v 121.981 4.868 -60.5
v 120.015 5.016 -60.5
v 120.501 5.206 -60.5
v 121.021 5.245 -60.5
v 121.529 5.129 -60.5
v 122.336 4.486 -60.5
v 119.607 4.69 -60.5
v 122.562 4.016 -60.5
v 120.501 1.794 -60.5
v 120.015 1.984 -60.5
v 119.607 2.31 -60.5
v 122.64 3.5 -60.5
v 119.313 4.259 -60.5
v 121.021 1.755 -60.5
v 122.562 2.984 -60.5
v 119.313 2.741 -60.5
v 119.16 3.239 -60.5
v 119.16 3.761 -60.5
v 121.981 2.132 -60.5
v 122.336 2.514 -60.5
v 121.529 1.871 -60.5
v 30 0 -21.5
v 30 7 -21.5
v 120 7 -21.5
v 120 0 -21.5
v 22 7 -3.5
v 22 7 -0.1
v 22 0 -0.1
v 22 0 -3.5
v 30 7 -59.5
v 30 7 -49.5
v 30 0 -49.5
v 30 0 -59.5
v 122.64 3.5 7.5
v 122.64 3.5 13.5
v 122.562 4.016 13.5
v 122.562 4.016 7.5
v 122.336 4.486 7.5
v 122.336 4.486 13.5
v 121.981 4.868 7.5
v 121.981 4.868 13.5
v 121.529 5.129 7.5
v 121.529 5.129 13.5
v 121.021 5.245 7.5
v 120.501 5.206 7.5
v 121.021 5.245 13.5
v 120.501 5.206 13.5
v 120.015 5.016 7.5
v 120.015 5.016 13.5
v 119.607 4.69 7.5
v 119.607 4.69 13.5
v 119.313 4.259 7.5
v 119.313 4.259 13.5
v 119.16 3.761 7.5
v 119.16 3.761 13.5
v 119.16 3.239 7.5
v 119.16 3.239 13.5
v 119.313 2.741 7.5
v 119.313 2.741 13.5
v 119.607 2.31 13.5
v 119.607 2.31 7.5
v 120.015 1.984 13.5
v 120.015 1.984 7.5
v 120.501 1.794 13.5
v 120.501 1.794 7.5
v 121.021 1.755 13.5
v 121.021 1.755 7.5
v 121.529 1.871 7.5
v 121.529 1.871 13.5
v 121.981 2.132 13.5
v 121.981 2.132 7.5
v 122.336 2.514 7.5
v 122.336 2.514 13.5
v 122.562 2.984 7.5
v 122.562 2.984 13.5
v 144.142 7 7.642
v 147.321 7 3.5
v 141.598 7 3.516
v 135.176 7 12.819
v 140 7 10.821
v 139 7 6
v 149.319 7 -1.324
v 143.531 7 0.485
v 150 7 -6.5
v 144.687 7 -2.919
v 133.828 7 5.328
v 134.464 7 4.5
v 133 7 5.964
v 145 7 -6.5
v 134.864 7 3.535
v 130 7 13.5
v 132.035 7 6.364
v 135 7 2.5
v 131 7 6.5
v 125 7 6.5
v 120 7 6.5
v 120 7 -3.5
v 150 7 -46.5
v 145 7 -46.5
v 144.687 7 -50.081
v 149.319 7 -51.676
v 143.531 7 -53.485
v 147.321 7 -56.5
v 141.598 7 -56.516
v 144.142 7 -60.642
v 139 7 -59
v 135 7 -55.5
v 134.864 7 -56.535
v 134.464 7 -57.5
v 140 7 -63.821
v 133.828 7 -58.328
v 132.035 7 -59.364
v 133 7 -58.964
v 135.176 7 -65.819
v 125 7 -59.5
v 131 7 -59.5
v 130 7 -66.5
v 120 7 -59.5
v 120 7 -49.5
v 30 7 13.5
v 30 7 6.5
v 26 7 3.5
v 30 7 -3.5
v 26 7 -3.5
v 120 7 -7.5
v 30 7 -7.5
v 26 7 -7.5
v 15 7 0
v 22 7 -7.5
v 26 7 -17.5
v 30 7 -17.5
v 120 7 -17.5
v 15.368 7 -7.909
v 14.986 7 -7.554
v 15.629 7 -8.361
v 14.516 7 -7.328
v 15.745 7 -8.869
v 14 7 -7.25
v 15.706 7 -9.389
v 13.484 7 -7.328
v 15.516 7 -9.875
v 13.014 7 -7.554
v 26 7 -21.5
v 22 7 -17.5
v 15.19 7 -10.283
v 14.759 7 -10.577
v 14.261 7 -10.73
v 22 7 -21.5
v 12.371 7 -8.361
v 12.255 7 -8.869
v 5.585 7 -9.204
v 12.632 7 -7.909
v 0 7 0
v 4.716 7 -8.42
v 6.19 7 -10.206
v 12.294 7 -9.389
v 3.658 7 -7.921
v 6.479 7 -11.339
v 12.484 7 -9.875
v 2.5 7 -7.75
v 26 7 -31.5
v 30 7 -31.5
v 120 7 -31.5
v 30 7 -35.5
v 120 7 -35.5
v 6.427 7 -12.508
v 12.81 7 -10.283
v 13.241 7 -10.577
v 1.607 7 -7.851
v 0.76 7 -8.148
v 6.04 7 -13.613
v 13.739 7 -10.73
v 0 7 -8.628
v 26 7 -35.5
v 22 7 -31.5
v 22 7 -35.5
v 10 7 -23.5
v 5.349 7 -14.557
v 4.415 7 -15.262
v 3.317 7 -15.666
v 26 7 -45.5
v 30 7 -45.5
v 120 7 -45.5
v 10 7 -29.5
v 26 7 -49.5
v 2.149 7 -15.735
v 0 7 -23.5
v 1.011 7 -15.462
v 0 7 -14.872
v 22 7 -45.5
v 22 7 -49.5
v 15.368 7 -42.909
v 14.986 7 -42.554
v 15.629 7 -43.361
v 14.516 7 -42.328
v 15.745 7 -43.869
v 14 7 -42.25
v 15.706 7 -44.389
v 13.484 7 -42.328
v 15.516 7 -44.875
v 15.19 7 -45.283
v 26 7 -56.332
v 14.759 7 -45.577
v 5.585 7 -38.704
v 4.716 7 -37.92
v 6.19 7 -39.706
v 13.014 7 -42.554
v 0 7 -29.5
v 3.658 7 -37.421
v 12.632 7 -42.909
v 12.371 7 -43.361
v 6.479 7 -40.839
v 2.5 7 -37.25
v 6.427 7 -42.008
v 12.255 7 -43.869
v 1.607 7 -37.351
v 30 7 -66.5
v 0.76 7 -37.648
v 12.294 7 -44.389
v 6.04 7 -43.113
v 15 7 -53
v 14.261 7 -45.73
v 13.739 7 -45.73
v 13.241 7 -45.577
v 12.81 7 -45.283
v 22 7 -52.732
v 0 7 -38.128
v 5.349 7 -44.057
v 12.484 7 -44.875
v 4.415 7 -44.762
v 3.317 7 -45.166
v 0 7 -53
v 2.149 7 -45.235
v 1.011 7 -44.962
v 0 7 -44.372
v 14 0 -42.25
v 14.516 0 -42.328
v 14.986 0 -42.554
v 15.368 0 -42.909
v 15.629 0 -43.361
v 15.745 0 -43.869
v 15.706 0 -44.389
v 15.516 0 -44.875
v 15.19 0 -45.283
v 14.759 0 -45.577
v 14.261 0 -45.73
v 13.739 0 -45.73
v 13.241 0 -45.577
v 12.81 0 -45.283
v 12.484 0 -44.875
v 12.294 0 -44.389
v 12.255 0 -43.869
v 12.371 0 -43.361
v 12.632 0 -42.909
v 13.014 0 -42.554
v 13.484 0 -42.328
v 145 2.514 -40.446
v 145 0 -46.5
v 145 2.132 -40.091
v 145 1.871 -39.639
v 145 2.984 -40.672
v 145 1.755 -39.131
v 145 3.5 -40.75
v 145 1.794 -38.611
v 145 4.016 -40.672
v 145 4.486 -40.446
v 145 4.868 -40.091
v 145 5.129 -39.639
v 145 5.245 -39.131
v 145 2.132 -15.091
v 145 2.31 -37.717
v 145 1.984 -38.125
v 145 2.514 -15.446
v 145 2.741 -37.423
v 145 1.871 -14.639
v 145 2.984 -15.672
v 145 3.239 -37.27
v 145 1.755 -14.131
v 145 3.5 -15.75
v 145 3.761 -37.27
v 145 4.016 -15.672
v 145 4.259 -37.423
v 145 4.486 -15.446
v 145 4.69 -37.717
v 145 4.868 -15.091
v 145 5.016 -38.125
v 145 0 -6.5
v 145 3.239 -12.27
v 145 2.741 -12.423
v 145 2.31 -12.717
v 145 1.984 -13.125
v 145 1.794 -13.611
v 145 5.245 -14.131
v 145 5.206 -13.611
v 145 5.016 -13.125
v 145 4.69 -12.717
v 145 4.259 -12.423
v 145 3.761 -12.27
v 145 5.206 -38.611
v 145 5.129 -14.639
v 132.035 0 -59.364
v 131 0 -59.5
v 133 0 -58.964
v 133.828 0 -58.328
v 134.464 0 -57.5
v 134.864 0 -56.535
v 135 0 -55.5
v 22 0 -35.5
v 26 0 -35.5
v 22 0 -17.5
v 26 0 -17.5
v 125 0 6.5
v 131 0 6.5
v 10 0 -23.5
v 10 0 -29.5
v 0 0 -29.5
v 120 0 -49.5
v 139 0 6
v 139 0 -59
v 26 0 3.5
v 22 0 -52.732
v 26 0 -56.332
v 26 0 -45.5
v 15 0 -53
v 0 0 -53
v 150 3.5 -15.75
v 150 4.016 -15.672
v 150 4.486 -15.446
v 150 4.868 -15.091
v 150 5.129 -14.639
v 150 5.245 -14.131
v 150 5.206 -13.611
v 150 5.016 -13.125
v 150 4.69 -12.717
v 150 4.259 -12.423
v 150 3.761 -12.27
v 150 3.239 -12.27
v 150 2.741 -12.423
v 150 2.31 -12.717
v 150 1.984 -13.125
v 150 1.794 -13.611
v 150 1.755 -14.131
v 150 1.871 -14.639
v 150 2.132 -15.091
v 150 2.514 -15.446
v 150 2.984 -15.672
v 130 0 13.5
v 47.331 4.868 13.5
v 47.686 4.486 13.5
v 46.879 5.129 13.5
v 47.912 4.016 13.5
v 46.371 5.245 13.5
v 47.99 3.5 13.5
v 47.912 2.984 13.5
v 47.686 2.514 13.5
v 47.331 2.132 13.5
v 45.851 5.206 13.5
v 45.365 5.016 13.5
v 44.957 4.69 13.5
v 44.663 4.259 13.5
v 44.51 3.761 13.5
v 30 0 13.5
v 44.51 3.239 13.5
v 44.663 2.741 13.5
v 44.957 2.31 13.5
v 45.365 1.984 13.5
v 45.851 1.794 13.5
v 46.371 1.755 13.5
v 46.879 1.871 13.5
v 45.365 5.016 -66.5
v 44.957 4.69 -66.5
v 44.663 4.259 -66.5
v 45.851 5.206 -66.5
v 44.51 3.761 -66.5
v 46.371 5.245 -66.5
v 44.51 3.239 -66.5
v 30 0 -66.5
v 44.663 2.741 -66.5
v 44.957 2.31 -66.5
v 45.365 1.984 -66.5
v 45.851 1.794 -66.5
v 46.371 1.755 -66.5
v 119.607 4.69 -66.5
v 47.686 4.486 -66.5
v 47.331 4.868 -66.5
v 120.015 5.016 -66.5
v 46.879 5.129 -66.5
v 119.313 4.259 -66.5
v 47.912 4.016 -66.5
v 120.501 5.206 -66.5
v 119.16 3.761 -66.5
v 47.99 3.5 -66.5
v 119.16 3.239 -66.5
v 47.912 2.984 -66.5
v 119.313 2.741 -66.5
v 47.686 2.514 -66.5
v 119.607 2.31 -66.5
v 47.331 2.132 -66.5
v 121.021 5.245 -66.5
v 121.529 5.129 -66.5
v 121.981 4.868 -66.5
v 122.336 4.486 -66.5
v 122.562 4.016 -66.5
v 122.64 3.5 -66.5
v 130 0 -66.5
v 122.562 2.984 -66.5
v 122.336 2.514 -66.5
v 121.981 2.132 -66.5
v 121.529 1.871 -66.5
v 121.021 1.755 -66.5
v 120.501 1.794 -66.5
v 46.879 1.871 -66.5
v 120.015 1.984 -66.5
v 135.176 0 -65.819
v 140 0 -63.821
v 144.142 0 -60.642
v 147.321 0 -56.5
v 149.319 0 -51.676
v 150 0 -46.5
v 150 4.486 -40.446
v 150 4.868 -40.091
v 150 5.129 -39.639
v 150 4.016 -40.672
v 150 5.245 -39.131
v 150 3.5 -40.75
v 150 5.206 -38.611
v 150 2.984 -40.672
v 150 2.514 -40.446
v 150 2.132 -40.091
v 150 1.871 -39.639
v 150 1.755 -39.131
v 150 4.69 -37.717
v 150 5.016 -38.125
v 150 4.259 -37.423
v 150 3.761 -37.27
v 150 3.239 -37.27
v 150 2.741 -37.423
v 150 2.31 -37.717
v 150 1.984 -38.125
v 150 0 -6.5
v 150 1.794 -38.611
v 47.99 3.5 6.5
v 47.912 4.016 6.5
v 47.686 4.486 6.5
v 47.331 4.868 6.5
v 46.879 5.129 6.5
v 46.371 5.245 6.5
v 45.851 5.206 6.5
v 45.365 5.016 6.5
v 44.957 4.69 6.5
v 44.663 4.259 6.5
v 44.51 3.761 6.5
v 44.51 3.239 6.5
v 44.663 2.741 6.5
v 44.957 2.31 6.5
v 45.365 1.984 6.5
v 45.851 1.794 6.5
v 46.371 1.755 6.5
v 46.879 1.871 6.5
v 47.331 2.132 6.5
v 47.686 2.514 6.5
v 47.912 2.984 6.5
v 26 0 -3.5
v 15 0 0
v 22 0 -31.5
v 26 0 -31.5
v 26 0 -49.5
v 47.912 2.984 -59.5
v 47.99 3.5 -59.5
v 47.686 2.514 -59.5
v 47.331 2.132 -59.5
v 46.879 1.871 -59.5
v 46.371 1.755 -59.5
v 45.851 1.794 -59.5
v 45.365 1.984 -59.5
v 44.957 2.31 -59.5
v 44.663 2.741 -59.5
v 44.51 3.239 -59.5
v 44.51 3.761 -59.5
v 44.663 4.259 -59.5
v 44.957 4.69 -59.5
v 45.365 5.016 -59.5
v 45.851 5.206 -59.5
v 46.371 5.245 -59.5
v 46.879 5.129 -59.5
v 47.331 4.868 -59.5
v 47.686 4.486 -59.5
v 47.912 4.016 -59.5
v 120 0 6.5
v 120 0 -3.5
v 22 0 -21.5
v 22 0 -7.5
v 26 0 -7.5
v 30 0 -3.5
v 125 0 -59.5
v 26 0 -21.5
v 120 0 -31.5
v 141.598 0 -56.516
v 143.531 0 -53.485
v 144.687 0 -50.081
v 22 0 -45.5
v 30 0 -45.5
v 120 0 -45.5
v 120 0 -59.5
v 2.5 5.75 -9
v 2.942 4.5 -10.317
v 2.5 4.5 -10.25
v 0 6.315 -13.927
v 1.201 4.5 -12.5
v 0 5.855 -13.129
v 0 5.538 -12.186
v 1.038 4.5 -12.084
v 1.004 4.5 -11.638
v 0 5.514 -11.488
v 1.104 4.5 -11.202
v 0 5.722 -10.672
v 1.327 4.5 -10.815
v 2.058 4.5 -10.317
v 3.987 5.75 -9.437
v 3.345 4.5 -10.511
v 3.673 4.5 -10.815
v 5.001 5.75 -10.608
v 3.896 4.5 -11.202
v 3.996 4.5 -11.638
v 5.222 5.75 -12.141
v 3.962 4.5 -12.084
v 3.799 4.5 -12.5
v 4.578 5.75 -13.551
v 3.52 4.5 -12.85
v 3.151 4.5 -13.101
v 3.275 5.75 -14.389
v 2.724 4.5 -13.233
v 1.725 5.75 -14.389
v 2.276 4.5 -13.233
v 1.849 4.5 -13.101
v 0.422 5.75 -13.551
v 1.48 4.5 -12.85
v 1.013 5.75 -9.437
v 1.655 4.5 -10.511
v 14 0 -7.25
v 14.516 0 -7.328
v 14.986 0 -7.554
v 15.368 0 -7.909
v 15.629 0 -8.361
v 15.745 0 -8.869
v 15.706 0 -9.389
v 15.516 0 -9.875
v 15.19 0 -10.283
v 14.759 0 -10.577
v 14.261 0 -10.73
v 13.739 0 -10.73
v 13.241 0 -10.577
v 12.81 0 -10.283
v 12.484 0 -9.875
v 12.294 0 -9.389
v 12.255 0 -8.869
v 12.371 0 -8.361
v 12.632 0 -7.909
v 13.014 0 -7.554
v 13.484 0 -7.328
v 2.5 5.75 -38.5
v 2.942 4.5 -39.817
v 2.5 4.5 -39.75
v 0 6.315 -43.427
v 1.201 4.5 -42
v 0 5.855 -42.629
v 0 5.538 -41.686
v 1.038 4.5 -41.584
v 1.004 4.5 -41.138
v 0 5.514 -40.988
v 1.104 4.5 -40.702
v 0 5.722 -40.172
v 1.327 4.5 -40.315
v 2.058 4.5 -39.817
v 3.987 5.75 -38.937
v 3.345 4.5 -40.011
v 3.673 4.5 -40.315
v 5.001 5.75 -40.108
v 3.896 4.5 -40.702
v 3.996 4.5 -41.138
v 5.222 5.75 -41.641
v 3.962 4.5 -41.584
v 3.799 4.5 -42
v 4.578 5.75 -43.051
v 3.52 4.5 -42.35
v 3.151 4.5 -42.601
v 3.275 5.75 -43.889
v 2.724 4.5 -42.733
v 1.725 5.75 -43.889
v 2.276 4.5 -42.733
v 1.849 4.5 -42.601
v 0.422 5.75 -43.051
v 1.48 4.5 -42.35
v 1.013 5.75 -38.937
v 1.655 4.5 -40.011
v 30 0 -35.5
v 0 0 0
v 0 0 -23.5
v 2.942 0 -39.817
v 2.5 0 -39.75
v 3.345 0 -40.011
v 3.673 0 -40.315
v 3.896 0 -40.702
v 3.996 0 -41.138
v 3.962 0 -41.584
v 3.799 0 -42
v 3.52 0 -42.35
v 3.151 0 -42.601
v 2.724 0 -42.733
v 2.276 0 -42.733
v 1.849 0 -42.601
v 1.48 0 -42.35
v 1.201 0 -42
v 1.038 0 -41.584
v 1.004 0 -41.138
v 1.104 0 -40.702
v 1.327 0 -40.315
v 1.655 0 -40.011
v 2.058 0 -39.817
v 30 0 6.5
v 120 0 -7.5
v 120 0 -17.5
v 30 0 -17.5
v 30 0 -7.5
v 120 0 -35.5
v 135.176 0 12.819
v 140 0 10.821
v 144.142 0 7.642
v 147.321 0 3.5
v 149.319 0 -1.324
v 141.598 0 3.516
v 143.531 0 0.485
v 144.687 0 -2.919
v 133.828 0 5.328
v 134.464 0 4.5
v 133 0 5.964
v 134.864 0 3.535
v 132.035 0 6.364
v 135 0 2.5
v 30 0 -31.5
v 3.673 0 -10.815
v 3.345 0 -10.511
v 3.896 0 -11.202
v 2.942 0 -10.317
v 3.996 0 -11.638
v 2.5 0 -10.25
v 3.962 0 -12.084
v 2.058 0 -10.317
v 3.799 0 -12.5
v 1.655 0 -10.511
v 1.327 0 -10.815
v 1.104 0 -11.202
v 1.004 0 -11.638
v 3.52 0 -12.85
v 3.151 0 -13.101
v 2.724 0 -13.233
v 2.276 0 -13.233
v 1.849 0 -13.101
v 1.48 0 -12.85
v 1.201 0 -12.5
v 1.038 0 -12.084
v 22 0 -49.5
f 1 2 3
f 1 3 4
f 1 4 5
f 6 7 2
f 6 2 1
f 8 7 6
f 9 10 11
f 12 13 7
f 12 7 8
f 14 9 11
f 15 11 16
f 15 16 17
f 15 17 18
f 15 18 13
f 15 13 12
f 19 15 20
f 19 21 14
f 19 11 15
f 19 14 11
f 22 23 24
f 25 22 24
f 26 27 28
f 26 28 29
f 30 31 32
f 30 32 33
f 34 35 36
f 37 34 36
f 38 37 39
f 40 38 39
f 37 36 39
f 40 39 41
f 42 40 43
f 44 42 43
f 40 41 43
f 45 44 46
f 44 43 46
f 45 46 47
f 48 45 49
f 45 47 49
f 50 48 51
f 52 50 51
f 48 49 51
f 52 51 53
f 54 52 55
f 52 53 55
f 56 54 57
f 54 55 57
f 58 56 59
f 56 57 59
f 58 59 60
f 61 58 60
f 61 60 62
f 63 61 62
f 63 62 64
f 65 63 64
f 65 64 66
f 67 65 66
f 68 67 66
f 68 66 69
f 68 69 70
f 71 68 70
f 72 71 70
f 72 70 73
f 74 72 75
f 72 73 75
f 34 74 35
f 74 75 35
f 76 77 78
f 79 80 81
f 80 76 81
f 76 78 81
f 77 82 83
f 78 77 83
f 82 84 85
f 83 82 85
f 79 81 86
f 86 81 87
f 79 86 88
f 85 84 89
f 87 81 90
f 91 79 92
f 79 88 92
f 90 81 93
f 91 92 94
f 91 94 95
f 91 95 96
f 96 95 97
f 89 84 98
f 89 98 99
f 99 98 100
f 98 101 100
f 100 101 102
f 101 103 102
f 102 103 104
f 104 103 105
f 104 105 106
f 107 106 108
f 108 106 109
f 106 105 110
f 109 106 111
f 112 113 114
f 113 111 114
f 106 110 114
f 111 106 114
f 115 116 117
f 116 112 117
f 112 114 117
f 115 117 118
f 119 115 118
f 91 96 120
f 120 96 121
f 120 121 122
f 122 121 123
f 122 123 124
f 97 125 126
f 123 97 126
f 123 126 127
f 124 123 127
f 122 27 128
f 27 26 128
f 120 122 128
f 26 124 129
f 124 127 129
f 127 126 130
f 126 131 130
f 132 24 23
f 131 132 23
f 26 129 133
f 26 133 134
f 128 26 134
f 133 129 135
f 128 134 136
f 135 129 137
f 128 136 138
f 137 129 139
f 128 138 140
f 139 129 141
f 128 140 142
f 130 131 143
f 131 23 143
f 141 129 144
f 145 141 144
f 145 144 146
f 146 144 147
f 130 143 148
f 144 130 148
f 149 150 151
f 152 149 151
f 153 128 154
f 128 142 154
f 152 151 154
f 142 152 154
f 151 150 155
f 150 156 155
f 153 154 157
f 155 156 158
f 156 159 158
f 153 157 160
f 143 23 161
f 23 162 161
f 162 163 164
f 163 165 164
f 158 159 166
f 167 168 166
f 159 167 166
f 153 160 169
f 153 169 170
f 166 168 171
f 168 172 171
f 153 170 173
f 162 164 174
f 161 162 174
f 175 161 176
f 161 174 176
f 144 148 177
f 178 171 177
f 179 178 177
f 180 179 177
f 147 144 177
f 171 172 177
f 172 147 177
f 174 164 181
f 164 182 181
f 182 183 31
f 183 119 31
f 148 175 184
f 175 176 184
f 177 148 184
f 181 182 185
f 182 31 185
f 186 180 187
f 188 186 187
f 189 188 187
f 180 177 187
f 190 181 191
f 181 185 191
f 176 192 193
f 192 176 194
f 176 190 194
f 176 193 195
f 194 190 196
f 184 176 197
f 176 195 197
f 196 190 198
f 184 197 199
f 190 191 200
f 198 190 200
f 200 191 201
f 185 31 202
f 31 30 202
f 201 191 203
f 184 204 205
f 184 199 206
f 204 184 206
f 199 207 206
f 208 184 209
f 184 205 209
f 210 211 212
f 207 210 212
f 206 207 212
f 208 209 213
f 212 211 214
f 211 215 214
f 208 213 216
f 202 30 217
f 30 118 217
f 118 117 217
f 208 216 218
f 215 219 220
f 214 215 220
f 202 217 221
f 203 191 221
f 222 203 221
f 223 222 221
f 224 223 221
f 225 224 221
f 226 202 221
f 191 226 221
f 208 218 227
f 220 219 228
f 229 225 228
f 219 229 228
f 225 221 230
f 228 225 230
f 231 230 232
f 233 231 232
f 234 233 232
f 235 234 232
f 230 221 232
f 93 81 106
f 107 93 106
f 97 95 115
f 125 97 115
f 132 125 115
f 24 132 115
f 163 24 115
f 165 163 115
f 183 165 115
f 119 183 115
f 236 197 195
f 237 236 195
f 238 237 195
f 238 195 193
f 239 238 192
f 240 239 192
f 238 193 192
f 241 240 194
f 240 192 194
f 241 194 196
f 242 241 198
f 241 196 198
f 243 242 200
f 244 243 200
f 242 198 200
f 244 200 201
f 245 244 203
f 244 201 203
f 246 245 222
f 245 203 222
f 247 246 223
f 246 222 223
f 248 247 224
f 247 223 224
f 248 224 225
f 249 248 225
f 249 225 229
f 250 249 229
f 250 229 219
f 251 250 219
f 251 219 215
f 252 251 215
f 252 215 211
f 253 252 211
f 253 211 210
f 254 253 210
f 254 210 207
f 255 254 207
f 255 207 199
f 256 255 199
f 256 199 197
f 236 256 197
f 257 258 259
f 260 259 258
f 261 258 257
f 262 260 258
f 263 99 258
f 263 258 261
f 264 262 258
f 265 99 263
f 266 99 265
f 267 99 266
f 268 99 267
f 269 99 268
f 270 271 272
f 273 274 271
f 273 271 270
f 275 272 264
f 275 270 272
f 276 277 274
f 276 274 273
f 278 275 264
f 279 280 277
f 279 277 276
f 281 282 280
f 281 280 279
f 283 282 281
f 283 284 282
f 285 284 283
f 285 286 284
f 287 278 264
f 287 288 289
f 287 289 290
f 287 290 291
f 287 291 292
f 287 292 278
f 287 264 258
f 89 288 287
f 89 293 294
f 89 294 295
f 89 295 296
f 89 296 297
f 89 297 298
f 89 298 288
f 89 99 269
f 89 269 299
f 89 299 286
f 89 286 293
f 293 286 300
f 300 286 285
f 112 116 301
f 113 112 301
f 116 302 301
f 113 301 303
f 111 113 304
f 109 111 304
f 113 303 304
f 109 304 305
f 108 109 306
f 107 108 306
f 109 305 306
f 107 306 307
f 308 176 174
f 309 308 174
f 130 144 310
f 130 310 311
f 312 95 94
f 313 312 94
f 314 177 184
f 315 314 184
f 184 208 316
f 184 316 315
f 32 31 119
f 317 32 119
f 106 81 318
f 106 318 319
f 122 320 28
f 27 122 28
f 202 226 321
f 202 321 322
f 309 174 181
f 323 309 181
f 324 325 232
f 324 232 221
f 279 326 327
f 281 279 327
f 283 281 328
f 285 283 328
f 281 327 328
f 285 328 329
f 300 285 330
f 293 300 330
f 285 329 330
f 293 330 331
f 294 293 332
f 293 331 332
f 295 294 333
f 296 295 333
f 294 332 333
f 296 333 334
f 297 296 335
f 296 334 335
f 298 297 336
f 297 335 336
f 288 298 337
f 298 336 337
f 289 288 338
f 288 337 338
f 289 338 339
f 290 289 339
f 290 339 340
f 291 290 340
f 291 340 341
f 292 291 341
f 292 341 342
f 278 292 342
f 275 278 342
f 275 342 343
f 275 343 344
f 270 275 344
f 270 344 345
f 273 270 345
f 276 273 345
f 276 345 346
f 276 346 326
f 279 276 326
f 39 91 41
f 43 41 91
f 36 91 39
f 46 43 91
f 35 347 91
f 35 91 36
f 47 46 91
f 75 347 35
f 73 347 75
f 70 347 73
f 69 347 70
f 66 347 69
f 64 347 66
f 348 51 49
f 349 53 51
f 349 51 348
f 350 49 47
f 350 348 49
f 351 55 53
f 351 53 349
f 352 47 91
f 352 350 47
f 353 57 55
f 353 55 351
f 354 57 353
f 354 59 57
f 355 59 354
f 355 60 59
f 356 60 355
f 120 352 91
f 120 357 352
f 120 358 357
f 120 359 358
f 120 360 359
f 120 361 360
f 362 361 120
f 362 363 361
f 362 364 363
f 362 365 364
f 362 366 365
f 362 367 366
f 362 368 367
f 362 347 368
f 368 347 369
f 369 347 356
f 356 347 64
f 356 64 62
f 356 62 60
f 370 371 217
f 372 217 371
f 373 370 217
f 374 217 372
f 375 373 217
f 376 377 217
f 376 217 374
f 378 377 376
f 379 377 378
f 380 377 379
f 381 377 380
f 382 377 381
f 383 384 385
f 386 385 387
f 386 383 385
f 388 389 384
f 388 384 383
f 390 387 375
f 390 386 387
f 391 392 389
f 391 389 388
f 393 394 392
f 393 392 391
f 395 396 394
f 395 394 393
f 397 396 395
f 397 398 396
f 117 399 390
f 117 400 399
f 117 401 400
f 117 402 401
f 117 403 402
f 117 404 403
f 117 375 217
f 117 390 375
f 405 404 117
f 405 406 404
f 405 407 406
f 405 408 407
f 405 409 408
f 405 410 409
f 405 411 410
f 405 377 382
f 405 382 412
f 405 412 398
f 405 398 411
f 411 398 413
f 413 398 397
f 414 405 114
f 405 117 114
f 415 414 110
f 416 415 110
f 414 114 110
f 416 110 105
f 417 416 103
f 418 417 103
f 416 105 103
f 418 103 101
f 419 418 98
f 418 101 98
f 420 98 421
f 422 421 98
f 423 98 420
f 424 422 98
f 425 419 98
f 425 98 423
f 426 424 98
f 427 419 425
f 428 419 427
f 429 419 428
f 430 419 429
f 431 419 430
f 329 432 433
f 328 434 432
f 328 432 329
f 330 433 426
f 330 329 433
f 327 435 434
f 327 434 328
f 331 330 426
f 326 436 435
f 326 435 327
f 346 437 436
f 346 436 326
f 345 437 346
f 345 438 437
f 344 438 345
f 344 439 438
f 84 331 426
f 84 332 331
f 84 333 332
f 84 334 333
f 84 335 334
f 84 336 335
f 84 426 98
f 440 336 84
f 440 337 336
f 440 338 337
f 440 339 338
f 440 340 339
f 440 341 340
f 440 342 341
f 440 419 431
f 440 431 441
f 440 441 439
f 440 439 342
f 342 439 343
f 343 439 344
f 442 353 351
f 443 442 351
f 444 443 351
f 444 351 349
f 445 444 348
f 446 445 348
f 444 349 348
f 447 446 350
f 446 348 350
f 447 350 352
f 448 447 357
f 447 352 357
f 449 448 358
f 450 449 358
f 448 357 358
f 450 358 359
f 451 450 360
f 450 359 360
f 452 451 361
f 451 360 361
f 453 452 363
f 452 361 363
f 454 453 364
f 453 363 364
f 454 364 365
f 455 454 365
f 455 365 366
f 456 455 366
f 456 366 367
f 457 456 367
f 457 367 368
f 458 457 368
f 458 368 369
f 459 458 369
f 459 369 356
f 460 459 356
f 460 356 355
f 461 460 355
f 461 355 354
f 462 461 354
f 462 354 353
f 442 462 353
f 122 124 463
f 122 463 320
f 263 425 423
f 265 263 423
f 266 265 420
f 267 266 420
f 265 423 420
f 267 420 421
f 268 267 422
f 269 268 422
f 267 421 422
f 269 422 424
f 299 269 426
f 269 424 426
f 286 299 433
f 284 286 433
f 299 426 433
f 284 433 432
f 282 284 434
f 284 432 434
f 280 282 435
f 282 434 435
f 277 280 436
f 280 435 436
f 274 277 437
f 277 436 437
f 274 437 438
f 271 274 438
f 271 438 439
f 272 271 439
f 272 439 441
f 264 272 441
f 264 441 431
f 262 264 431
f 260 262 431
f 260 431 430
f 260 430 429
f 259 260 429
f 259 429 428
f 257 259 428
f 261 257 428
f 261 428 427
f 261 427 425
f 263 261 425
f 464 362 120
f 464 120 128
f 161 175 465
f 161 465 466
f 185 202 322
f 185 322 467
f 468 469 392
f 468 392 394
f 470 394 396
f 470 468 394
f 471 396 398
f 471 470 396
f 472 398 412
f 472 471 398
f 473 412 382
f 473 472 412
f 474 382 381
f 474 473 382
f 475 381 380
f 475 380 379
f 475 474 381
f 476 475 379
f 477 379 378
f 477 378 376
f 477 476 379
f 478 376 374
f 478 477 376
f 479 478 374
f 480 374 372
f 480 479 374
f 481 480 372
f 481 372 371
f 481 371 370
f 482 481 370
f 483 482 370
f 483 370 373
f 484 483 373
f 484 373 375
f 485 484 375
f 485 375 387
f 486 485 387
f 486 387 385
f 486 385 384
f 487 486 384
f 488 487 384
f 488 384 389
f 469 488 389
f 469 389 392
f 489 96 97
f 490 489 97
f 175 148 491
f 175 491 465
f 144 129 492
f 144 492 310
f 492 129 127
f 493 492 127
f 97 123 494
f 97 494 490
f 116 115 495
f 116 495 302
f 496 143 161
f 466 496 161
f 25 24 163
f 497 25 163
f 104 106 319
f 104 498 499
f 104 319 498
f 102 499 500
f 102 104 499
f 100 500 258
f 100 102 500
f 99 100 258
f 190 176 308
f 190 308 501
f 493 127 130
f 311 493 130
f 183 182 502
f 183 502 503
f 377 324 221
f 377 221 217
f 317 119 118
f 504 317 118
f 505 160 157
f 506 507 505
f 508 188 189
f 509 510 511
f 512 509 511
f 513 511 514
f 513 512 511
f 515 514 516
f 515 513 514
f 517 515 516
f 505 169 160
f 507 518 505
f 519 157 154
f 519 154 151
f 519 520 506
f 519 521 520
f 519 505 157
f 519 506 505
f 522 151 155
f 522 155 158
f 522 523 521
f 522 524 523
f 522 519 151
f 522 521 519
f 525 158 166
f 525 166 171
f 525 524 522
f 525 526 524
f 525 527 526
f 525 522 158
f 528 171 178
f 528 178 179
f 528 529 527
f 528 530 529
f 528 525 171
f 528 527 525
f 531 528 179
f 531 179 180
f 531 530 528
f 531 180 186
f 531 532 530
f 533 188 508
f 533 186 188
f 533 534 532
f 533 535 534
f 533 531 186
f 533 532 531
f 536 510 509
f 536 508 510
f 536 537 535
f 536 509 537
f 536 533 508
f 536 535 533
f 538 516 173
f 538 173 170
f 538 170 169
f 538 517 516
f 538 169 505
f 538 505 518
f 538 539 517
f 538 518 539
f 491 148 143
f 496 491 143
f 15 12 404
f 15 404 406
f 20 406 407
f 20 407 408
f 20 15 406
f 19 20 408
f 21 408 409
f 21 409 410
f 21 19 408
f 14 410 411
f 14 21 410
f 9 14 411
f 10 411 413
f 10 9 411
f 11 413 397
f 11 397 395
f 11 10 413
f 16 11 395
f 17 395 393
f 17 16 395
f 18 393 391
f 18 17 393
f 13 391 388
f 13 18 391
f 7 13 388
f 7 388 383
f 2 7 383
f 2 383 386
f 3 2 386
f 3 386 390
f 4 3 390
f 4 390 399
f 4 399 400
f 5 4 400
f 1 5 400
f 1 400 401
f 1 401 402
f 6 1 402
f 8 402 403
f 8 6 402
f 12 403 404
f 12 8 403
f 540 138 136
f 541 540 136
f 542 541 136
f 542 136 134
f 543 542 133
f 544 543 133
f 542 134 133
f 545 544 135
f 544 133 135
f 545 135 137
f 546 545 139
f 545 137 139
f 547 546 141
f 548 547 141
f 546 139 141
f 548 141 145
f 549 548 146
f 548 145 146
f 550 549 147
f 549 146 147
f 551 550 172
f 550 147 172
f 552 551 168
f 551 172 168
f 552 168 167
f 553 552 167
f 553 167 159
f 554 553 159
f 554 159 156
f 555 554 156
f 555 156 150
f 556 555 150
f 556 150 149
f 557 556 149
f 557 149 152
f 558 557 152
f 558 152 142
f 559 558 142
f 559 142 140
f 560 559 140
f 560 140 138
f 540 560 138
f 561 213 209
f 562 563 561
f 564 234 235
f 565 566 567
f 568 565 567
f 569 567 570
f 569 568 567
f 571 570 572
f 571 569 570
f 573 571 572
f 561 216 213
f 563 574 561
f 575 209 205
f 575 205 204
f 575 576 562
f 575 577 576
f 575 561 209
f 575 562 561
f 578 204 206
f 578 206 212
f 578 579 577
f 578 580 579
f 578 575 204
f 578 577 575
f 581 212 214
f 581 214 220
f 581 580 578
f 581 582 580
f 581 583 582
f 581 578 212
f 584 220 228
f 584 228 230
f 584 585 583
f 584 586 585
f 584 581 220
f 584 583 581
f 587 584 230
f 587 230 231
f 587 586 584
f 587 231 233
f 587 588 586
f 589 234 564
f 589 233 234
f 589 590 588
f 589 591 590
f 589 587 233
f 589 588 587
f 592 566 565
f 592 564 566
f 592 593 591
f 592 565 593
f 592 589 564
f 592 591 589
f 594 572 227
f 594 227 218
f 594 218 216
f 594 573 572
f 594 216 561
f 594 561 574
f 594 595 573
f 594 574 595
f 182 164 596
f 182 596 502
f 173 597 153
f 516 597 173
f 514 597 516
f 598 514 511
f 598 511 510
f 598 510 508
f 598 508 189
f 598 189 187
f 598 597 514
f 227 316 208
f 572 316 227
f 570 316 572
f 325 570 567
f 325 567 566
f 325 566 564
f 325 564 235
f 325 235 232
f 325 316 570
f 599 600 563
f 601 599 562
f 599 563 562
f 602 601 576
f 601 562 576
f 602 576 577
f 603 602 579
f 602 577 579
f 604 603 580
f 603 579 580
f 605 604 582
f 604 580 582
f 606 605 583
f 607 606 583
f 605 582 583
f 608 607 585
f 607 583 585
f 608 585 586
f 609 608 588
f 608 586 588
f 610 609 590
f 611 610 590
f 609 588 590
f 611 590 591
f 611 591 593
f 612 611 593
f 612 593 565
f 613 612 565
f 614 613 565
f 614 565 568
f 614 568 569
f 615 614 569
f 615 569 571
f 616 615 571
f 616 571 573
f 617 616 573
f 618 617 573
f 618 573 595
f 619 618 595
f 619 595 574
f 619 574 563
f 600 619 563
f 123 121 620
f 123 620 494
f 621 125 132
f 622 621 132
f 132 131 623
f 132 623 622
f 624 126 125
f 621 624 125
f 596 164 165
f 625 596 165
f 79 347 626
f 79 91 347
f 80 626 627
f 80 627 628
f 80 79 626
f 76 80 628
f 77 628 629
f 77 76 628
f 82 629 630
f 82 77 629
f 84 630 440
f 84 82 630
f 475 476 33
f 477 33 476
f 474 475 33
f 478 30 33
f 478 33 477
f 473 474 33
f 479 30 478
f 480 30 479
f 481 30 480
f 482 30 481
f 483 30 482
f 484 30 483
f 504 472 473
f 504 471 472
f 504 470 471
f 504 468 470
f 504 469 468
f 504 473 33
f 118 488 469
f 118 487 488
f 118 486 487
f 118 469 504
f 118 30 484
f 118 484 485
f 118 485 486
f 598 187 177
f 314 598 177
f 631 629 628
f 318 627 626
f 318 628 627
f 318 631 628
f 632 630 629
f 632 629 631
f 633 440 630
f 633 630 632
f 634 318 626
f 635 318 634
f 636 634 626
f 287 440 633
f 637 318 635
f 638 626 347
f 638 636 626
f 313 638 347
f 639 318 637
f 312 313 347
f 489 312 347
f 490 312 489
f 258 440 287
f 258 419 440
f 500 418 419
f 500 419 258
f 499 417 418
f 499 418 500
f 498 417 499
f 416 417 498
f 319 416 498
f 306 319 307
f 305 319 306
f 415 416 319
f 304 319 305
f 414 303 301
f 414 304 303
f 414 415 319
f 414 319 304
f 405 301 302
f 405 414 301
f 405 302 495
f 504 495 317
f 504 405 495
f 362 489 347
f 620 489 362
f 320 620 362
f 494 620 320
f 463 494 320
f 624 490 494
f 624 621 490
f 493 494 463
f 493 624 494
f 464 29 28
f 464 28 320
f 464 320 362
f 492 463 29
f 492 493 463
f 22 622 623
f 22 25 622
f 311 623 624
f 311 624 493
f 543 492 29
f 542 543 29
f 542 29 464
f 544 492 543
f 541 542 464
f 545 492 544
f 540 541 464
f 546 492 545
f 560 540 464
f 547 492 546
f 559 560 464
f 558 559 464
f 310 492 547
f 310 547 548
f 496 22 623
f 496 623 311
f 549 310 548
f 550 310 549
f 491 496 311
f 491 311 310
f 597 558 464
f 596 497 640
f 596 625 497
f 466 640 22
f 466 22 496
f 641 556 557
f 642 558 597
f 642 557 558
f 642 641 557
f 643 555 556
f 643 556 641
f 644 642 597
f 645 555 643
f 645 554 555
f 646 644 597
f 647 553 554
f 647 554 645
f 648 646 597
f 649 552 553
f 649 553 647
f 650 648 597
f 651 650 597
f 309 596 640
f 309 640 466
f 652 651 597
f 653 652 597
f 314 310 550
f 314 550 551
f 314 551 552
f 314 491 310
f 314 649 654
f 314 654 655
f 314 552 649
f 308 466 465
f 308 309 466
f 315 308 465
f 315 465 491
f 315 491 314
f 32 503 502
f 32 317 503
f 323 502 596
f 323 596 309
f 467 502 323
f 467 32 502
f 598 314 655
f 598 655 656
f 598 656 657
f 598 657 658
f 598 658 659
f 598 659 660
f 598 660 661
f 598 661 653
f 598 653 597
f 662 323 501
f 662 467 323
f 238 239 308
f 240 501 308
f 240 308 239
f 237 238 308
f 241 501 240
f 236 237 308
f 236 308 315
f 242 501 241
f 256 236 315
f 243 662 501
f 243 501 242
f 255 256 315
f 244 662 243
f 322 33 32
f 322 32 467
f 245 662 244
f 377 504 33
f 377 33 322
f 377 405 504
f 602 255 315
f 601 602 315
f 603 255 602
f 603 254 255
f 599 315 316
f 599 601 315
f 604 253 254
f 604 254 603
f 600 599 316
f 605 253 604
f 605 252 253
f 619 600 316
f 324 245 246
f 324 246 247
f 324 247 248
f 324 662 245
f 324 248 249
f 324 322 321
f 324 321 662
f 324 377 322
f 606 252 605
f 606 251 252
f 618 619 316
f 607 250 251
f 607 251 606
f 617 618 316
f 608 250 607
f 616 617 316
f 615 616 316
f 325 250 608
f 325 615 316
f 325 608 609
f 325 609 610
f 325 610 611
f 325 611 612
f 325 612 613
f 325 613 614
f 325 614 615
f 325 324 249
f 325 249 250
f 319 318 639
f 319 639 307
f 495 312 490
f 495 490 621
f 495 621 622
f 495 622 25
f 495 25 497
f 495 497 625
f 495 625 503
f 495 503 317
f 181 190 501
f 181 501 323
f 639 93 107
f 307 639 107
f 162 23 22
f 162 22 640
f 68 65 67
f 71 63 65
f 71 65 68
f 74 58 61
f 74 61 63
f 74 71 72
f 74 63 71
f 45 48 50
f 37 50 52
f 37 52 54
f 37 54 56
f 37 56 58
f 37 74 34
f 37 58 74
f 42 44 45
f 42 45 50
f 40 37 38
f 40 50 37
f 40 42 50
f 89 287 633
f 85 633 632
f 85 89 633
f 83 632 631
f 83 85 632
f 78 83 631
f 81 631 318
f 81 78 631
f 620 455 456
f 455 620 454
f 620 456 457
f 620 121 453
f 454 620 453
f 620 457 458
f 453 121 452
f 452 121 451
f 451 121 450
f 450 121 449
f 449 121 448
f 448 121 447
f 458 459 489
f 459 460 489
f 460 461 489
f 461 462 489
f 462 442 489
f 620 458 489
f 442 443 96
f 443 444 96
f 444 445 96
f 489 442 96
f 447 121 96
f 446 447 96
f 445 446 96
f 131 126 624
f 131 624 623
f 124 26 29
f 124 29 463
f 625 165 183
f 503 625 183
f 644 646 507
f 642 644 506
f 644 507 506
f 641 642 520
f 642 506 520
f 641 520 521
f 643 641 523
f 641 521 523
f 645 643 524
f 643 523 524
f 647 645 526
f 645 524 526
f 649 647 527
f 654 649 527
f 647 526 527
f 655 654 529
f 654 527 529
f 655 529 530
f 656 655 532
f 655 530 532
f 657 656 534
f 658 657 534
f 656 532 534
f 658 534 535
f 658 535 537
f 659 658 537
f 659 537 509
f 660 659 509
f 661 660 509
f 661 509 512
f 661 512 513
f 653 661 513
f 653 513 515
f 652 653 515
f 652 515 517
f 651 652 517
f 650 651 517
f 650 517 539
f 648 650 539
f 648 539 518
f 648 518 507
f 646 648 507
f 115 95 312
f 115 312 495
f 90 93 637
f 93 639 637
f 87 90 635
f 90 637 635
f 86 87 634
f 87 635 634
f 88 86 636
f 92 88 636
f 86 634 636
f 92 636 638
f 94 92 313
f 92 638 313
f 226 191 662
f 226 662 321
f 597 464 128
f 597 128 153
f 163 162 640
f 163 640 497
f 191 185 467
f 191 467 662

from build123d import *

# Parameters (mm, degrees)
Y_KSEKLIK_EKSTR_ZYON1_DEPTH = 7
IZIM2_R                     = 1.5
KES_EKSTR_ZYON1_DEPTH       = 7
PAH1_SIZE                   = 2.5
IZIM3_R                     = 1.75
KES_EKSTR_ZYON2_DEPTH       = 10
KES_EKSTR_ZYON3_START       = -10
IZIM4_R                     = 1.75
KES_EKSTR_ZYON3_DEPTH       = 10
RADYUS1_R                   = 20
IZIM5_W                     = 90
IZIM5_H                     = 10
IZIM5_W_2                   = 10
IZIM5_H_2                   = 66
KES_EKSTR_ZYON4_DEPTH       = 10
RADYUS2_R                   = 4
KES_EKSTR_ZYON5_DEPTH       = 10
IZIM7_R                     = 1.75
KES_EKSTR_ZYON6_DEPTH       = 7
IZIM8_W                     = 10
IZIM8_H                     = 6
KES_EKSTR_ZYON7_DEPTH       = 10
IZIM9_R                     = 1.75
KES_EKSTR_ZYON8_DEPTH       = 10
IZIM10_R                    = 1.75
KES_EKSTR_ZYON9_DEPTH       = 6
KES_EKSTR_ZYON10_START      = -6
IZIM11_R                    = 1.75
KES_EKSTR_ZYON10_DEPTH      = 6
IZIM12_W                    = 4
IZIM12_H                    = 10
KES_EKSTR_ZYON11_DEPTH      = 10


with BuildPart() as part:
    # Çizim1 → Yükseklik-Ekstrüzyon1 (new body)
    with BuildSketch(Plane(origin=(0, 0, 0), x_dir=(1, 0, 0), z_dir=(0, 1, 0))):
        Polygon((0, 0), (0, 53), (15, 53), (30, 66.5), (150, 66.5), (150, -13.5), (30, -13.5), (15, 0), align=None)
    extrude(amount=Y_KSEKLIK_EKSTR_ZYON1_DEPTH)

    # Çizim2 → Kes-Ekstrüzyon1 (cut)
    with BuildSketch(Plane(origin=(0, 7, 0), x_dir=(1, 0, 0), z_dir=(0, 1, 0))):
        with Locations(Location((2.5, 41.25, 0), (0, 0, 270))):
            Circle(IZIM2_R)
        with Locations(Location((2.5, 11.75, 0), (0, 0, 270))):
            Circle(IZIM2_R)
    extrude(amount=-KES_EKSTR_ZYON1_DEPTH, mode=Mode.SUBTRACT)

    # Pah1
    # the kernel refuses this chamfer: 2.5 mm, written as the material it takes off along each edge
    with BuildSketch(Plane(origin=(2.5, 7, -41.25), x_dir=(0, 0, 1), z_dir=(-1, 0, 0))) as pah1_piece_1:
        Polygon((1.5 + PAH1_SIZE, 0), (1.5, -PAH1_SIZE), (1.5, 0), align=None)
    revolve(axis=Axis((2.5, 7, -41.25), (0, 1, 0)), mode=Mode.SUBTRACT)
    with BuildSketch(Plane(origin=(2.5, 7, -11.75), x_dir=(0, 0, 1), z_dir=(-1, 0, 0))) as pah1_piece_2:
        Polygon((1.5 + PAH1_SIZE, 0), (1.5, -PAH1_SIZE), (1.5, 0), align=None)
    revolve(axis=Axis((2.5, 7, -11.75), (0, 1, 0)), mode=Mode.SUBTRACT)

    # Çizim3 → Kes-Ekstrüzyon2 (cut)
    with BuildSketch(Plane.XY.offset(13.5)):
        with Locations((46.24, 3.5)):
            Circle(IZIM3_R)
    extrude(amount=-KES_EKSTR_ZYON2_DEPTH, mode=Mode.SUBTRACT)

    # Çizim4 → Kes-Ekstrüzyon3 (cut)
    with BuildSketch(Plane(origin=(0, 0, -66.5), x_dir=(-1, 0, 0), z_dir=(0, 0, -1)).offset(KES_EKSTR_ZYON3_START)):
        with Locations(Location((-46.24, 3.5, 0), (0, 0, 180))):
            Circle(IZIM4_R)
    extrude(amount=KES_EKSTR_ZYON3_DEPTH, mode=Mode.SUBTRACT)

    # Radyus1
    radyus1_edges = [part.edges().sort_by_distance(p)[0] for p in [
        (150, 3.5, -66.5),
        (150, 3.5, 13.5),
    ]]
    fillet(radyus1_edges, radius=RADYUS1_R)

    # Çizim5 → Kes-Ekstrüzyon4 (cut)
    with BuildSketch(Plane(origin=(0, 7, 0), x_dir=(1, 0, 0), z_dir=(0, 1, 0))):
        with Locations((75, -1.5)):
            Rectangle(IZIM5_W, IZIM5_H)
        with Locations((75, 26.5)):
            Rectangle(IZIM5_W, IZIM5_H)
        with Locations((75, 40.5)):
            Rectangle(IZIM5_W, IZIM5_H)
        with Locations((75, 54.5)):
            Rectangle(IZIM5_W, IZIM5_H)
        with Locations((75, 12.5)):
            Rectangle(IZIM5_W, IZIM5_H)
        with Locations((130, 26.5)):
            Rectangle(IZIM5_W_2, IZIM5_H_2)
    extrude(amount=-KES_EKSTR_ZYON4_DEPTH, mode=Mode.SUBTRACT)

    # Radyus2
    radyus2_edges = [part.edges().sort_by_distance(p)[0] for p in [
        (135, 3.5, -59.5),
        (135, 3.5, 6.5),
    ]]
    fillet(radyus2_edges, radius=RADYUS2_R)

    # Çizim6 → Kes-Ekstrüzyon5 (cut)
    with BuildSketch(Plane(origin=(0, 7, 0), x_dir=(1, 0, 0), z_dir=(0, 1, 0))):
        with BuildLine():
            Line((139, -6), (139, 59))
            ThreePointArc((139, 59), (143.530979443, 53.484870133), (145, 46.5))
            Line((145, 46.5), (145, 6.5))
            ThreePointArc((145, 6.5), (143.530979443, -0.484870133), (139, -6))
        make_face()
    extrude(amount=-KES_EKSTR_ZYON5_DEPTH, mode=Mode.SUBTRACT)

    # Çizim7 → Kes-Ekstrüzyon6 (cut)
    with BuildSketch(Plane(origin=(150, 0, 0), x_dir=(0, 0, -1), z_dir=(1, 0, 0))):
        with Locations((14, 3.5)):
            Circle(IZIM7_R)
        with Locations((39, 3.5)):
            Circle(IZIM7_R)
    extrude(amount=-KES_EKSTR_ZYON6_DEPTH, mode=Mode.SUBTRACT)

    # Çizim8 → Kes-Ekstrüzyon7 (cut)
    with BuildSketch(Plane(origin=(0, 7, 0), x_dir=(1, 0, 0), z_dir=(0, 1, 0))):
        with Locations((5, 26.5)):
            Rectangle(IZIM8_W, IZIM8_H)
    extrude(amount=-KES_EKSTR_ZYON7_DEPTH, mode=Mode.SUBTRACT)

    # Çizim9 → Kes-Ekstrüzyon8 (cut)
    with BuildSketch(Plane(origin=(0, 7, 0), x_dir=(1, 0, 0), z_dir=(0, 1, 0))):
        with Locations(Location((14, 44, 0), (0, 0, 270))):
            Circle(IZIM9_R)
        with Locations(Location((14, 9, 0), (0, 0, 270))):
            Circle(IZIM9_R)
    extrude(amount=-KES_EKSTR_ZYON8_DEPTH, mode=Mode.SUBTRACT)

    # Çizim10 → Kes-Ekstrüzyon9 (cut)
    with BuildSketch(Plane.XY.offset(13.5)):
        with Locations((120.89, 3.5)):
            Circle(IZIM10_R)
    extrude(amount=-KES_EKSTR_ZYON9_DEPTH, mode=Mode.SUBTRACT)

    # Çizim11 → Kes-Ekstrüzyon10 (cut)
    with BuildSketch(Plane(origin=(0, 0, -66.5), x_dir=(-1, 0, 0), z_dir=(0, 0, -1)).offset(KES_EKSTR_ZYON10_START)):
        with Locations(Location((-120.89, 3.5, 0), (0, 0, 180))):
            Circle(IZIM11_R)
    extrude(amount=KES_EKSTR_ZYON10_DEPTH, mode=Mode.SUBTRACT)

    # Çizim12 → Kes-Ekstrüzyon11 (cut)
    with BuildSketch(Plane(origin=(0, 7, 0), x_dir=(1, 0, 0), z_dir=(0, 1, 0))):
        Polygon((26, 56.331873347), (26, 49.5), (22, 49.5), (22, 52.731873347), align=None)
        Polygon((26, -3.5), (22, 0.1), (22, 3.5), (26, 3.5), align=None)
        with Locations((24, 40.5)):
            Rectangle(IZIM12_W, IZIM12_H)
        with Locations((24, 26.5)):
            Rectangle(IZIM12_W, IZIM12_H)
        with Locations((24, 12.5)):
            Rectangle(IZIM12_W, IZIM12_H)
    extrude(amount=-KES_EKSTR_ZYON11_DEPTH, mode=Mode.SUBTRACT)


solid = part.part
